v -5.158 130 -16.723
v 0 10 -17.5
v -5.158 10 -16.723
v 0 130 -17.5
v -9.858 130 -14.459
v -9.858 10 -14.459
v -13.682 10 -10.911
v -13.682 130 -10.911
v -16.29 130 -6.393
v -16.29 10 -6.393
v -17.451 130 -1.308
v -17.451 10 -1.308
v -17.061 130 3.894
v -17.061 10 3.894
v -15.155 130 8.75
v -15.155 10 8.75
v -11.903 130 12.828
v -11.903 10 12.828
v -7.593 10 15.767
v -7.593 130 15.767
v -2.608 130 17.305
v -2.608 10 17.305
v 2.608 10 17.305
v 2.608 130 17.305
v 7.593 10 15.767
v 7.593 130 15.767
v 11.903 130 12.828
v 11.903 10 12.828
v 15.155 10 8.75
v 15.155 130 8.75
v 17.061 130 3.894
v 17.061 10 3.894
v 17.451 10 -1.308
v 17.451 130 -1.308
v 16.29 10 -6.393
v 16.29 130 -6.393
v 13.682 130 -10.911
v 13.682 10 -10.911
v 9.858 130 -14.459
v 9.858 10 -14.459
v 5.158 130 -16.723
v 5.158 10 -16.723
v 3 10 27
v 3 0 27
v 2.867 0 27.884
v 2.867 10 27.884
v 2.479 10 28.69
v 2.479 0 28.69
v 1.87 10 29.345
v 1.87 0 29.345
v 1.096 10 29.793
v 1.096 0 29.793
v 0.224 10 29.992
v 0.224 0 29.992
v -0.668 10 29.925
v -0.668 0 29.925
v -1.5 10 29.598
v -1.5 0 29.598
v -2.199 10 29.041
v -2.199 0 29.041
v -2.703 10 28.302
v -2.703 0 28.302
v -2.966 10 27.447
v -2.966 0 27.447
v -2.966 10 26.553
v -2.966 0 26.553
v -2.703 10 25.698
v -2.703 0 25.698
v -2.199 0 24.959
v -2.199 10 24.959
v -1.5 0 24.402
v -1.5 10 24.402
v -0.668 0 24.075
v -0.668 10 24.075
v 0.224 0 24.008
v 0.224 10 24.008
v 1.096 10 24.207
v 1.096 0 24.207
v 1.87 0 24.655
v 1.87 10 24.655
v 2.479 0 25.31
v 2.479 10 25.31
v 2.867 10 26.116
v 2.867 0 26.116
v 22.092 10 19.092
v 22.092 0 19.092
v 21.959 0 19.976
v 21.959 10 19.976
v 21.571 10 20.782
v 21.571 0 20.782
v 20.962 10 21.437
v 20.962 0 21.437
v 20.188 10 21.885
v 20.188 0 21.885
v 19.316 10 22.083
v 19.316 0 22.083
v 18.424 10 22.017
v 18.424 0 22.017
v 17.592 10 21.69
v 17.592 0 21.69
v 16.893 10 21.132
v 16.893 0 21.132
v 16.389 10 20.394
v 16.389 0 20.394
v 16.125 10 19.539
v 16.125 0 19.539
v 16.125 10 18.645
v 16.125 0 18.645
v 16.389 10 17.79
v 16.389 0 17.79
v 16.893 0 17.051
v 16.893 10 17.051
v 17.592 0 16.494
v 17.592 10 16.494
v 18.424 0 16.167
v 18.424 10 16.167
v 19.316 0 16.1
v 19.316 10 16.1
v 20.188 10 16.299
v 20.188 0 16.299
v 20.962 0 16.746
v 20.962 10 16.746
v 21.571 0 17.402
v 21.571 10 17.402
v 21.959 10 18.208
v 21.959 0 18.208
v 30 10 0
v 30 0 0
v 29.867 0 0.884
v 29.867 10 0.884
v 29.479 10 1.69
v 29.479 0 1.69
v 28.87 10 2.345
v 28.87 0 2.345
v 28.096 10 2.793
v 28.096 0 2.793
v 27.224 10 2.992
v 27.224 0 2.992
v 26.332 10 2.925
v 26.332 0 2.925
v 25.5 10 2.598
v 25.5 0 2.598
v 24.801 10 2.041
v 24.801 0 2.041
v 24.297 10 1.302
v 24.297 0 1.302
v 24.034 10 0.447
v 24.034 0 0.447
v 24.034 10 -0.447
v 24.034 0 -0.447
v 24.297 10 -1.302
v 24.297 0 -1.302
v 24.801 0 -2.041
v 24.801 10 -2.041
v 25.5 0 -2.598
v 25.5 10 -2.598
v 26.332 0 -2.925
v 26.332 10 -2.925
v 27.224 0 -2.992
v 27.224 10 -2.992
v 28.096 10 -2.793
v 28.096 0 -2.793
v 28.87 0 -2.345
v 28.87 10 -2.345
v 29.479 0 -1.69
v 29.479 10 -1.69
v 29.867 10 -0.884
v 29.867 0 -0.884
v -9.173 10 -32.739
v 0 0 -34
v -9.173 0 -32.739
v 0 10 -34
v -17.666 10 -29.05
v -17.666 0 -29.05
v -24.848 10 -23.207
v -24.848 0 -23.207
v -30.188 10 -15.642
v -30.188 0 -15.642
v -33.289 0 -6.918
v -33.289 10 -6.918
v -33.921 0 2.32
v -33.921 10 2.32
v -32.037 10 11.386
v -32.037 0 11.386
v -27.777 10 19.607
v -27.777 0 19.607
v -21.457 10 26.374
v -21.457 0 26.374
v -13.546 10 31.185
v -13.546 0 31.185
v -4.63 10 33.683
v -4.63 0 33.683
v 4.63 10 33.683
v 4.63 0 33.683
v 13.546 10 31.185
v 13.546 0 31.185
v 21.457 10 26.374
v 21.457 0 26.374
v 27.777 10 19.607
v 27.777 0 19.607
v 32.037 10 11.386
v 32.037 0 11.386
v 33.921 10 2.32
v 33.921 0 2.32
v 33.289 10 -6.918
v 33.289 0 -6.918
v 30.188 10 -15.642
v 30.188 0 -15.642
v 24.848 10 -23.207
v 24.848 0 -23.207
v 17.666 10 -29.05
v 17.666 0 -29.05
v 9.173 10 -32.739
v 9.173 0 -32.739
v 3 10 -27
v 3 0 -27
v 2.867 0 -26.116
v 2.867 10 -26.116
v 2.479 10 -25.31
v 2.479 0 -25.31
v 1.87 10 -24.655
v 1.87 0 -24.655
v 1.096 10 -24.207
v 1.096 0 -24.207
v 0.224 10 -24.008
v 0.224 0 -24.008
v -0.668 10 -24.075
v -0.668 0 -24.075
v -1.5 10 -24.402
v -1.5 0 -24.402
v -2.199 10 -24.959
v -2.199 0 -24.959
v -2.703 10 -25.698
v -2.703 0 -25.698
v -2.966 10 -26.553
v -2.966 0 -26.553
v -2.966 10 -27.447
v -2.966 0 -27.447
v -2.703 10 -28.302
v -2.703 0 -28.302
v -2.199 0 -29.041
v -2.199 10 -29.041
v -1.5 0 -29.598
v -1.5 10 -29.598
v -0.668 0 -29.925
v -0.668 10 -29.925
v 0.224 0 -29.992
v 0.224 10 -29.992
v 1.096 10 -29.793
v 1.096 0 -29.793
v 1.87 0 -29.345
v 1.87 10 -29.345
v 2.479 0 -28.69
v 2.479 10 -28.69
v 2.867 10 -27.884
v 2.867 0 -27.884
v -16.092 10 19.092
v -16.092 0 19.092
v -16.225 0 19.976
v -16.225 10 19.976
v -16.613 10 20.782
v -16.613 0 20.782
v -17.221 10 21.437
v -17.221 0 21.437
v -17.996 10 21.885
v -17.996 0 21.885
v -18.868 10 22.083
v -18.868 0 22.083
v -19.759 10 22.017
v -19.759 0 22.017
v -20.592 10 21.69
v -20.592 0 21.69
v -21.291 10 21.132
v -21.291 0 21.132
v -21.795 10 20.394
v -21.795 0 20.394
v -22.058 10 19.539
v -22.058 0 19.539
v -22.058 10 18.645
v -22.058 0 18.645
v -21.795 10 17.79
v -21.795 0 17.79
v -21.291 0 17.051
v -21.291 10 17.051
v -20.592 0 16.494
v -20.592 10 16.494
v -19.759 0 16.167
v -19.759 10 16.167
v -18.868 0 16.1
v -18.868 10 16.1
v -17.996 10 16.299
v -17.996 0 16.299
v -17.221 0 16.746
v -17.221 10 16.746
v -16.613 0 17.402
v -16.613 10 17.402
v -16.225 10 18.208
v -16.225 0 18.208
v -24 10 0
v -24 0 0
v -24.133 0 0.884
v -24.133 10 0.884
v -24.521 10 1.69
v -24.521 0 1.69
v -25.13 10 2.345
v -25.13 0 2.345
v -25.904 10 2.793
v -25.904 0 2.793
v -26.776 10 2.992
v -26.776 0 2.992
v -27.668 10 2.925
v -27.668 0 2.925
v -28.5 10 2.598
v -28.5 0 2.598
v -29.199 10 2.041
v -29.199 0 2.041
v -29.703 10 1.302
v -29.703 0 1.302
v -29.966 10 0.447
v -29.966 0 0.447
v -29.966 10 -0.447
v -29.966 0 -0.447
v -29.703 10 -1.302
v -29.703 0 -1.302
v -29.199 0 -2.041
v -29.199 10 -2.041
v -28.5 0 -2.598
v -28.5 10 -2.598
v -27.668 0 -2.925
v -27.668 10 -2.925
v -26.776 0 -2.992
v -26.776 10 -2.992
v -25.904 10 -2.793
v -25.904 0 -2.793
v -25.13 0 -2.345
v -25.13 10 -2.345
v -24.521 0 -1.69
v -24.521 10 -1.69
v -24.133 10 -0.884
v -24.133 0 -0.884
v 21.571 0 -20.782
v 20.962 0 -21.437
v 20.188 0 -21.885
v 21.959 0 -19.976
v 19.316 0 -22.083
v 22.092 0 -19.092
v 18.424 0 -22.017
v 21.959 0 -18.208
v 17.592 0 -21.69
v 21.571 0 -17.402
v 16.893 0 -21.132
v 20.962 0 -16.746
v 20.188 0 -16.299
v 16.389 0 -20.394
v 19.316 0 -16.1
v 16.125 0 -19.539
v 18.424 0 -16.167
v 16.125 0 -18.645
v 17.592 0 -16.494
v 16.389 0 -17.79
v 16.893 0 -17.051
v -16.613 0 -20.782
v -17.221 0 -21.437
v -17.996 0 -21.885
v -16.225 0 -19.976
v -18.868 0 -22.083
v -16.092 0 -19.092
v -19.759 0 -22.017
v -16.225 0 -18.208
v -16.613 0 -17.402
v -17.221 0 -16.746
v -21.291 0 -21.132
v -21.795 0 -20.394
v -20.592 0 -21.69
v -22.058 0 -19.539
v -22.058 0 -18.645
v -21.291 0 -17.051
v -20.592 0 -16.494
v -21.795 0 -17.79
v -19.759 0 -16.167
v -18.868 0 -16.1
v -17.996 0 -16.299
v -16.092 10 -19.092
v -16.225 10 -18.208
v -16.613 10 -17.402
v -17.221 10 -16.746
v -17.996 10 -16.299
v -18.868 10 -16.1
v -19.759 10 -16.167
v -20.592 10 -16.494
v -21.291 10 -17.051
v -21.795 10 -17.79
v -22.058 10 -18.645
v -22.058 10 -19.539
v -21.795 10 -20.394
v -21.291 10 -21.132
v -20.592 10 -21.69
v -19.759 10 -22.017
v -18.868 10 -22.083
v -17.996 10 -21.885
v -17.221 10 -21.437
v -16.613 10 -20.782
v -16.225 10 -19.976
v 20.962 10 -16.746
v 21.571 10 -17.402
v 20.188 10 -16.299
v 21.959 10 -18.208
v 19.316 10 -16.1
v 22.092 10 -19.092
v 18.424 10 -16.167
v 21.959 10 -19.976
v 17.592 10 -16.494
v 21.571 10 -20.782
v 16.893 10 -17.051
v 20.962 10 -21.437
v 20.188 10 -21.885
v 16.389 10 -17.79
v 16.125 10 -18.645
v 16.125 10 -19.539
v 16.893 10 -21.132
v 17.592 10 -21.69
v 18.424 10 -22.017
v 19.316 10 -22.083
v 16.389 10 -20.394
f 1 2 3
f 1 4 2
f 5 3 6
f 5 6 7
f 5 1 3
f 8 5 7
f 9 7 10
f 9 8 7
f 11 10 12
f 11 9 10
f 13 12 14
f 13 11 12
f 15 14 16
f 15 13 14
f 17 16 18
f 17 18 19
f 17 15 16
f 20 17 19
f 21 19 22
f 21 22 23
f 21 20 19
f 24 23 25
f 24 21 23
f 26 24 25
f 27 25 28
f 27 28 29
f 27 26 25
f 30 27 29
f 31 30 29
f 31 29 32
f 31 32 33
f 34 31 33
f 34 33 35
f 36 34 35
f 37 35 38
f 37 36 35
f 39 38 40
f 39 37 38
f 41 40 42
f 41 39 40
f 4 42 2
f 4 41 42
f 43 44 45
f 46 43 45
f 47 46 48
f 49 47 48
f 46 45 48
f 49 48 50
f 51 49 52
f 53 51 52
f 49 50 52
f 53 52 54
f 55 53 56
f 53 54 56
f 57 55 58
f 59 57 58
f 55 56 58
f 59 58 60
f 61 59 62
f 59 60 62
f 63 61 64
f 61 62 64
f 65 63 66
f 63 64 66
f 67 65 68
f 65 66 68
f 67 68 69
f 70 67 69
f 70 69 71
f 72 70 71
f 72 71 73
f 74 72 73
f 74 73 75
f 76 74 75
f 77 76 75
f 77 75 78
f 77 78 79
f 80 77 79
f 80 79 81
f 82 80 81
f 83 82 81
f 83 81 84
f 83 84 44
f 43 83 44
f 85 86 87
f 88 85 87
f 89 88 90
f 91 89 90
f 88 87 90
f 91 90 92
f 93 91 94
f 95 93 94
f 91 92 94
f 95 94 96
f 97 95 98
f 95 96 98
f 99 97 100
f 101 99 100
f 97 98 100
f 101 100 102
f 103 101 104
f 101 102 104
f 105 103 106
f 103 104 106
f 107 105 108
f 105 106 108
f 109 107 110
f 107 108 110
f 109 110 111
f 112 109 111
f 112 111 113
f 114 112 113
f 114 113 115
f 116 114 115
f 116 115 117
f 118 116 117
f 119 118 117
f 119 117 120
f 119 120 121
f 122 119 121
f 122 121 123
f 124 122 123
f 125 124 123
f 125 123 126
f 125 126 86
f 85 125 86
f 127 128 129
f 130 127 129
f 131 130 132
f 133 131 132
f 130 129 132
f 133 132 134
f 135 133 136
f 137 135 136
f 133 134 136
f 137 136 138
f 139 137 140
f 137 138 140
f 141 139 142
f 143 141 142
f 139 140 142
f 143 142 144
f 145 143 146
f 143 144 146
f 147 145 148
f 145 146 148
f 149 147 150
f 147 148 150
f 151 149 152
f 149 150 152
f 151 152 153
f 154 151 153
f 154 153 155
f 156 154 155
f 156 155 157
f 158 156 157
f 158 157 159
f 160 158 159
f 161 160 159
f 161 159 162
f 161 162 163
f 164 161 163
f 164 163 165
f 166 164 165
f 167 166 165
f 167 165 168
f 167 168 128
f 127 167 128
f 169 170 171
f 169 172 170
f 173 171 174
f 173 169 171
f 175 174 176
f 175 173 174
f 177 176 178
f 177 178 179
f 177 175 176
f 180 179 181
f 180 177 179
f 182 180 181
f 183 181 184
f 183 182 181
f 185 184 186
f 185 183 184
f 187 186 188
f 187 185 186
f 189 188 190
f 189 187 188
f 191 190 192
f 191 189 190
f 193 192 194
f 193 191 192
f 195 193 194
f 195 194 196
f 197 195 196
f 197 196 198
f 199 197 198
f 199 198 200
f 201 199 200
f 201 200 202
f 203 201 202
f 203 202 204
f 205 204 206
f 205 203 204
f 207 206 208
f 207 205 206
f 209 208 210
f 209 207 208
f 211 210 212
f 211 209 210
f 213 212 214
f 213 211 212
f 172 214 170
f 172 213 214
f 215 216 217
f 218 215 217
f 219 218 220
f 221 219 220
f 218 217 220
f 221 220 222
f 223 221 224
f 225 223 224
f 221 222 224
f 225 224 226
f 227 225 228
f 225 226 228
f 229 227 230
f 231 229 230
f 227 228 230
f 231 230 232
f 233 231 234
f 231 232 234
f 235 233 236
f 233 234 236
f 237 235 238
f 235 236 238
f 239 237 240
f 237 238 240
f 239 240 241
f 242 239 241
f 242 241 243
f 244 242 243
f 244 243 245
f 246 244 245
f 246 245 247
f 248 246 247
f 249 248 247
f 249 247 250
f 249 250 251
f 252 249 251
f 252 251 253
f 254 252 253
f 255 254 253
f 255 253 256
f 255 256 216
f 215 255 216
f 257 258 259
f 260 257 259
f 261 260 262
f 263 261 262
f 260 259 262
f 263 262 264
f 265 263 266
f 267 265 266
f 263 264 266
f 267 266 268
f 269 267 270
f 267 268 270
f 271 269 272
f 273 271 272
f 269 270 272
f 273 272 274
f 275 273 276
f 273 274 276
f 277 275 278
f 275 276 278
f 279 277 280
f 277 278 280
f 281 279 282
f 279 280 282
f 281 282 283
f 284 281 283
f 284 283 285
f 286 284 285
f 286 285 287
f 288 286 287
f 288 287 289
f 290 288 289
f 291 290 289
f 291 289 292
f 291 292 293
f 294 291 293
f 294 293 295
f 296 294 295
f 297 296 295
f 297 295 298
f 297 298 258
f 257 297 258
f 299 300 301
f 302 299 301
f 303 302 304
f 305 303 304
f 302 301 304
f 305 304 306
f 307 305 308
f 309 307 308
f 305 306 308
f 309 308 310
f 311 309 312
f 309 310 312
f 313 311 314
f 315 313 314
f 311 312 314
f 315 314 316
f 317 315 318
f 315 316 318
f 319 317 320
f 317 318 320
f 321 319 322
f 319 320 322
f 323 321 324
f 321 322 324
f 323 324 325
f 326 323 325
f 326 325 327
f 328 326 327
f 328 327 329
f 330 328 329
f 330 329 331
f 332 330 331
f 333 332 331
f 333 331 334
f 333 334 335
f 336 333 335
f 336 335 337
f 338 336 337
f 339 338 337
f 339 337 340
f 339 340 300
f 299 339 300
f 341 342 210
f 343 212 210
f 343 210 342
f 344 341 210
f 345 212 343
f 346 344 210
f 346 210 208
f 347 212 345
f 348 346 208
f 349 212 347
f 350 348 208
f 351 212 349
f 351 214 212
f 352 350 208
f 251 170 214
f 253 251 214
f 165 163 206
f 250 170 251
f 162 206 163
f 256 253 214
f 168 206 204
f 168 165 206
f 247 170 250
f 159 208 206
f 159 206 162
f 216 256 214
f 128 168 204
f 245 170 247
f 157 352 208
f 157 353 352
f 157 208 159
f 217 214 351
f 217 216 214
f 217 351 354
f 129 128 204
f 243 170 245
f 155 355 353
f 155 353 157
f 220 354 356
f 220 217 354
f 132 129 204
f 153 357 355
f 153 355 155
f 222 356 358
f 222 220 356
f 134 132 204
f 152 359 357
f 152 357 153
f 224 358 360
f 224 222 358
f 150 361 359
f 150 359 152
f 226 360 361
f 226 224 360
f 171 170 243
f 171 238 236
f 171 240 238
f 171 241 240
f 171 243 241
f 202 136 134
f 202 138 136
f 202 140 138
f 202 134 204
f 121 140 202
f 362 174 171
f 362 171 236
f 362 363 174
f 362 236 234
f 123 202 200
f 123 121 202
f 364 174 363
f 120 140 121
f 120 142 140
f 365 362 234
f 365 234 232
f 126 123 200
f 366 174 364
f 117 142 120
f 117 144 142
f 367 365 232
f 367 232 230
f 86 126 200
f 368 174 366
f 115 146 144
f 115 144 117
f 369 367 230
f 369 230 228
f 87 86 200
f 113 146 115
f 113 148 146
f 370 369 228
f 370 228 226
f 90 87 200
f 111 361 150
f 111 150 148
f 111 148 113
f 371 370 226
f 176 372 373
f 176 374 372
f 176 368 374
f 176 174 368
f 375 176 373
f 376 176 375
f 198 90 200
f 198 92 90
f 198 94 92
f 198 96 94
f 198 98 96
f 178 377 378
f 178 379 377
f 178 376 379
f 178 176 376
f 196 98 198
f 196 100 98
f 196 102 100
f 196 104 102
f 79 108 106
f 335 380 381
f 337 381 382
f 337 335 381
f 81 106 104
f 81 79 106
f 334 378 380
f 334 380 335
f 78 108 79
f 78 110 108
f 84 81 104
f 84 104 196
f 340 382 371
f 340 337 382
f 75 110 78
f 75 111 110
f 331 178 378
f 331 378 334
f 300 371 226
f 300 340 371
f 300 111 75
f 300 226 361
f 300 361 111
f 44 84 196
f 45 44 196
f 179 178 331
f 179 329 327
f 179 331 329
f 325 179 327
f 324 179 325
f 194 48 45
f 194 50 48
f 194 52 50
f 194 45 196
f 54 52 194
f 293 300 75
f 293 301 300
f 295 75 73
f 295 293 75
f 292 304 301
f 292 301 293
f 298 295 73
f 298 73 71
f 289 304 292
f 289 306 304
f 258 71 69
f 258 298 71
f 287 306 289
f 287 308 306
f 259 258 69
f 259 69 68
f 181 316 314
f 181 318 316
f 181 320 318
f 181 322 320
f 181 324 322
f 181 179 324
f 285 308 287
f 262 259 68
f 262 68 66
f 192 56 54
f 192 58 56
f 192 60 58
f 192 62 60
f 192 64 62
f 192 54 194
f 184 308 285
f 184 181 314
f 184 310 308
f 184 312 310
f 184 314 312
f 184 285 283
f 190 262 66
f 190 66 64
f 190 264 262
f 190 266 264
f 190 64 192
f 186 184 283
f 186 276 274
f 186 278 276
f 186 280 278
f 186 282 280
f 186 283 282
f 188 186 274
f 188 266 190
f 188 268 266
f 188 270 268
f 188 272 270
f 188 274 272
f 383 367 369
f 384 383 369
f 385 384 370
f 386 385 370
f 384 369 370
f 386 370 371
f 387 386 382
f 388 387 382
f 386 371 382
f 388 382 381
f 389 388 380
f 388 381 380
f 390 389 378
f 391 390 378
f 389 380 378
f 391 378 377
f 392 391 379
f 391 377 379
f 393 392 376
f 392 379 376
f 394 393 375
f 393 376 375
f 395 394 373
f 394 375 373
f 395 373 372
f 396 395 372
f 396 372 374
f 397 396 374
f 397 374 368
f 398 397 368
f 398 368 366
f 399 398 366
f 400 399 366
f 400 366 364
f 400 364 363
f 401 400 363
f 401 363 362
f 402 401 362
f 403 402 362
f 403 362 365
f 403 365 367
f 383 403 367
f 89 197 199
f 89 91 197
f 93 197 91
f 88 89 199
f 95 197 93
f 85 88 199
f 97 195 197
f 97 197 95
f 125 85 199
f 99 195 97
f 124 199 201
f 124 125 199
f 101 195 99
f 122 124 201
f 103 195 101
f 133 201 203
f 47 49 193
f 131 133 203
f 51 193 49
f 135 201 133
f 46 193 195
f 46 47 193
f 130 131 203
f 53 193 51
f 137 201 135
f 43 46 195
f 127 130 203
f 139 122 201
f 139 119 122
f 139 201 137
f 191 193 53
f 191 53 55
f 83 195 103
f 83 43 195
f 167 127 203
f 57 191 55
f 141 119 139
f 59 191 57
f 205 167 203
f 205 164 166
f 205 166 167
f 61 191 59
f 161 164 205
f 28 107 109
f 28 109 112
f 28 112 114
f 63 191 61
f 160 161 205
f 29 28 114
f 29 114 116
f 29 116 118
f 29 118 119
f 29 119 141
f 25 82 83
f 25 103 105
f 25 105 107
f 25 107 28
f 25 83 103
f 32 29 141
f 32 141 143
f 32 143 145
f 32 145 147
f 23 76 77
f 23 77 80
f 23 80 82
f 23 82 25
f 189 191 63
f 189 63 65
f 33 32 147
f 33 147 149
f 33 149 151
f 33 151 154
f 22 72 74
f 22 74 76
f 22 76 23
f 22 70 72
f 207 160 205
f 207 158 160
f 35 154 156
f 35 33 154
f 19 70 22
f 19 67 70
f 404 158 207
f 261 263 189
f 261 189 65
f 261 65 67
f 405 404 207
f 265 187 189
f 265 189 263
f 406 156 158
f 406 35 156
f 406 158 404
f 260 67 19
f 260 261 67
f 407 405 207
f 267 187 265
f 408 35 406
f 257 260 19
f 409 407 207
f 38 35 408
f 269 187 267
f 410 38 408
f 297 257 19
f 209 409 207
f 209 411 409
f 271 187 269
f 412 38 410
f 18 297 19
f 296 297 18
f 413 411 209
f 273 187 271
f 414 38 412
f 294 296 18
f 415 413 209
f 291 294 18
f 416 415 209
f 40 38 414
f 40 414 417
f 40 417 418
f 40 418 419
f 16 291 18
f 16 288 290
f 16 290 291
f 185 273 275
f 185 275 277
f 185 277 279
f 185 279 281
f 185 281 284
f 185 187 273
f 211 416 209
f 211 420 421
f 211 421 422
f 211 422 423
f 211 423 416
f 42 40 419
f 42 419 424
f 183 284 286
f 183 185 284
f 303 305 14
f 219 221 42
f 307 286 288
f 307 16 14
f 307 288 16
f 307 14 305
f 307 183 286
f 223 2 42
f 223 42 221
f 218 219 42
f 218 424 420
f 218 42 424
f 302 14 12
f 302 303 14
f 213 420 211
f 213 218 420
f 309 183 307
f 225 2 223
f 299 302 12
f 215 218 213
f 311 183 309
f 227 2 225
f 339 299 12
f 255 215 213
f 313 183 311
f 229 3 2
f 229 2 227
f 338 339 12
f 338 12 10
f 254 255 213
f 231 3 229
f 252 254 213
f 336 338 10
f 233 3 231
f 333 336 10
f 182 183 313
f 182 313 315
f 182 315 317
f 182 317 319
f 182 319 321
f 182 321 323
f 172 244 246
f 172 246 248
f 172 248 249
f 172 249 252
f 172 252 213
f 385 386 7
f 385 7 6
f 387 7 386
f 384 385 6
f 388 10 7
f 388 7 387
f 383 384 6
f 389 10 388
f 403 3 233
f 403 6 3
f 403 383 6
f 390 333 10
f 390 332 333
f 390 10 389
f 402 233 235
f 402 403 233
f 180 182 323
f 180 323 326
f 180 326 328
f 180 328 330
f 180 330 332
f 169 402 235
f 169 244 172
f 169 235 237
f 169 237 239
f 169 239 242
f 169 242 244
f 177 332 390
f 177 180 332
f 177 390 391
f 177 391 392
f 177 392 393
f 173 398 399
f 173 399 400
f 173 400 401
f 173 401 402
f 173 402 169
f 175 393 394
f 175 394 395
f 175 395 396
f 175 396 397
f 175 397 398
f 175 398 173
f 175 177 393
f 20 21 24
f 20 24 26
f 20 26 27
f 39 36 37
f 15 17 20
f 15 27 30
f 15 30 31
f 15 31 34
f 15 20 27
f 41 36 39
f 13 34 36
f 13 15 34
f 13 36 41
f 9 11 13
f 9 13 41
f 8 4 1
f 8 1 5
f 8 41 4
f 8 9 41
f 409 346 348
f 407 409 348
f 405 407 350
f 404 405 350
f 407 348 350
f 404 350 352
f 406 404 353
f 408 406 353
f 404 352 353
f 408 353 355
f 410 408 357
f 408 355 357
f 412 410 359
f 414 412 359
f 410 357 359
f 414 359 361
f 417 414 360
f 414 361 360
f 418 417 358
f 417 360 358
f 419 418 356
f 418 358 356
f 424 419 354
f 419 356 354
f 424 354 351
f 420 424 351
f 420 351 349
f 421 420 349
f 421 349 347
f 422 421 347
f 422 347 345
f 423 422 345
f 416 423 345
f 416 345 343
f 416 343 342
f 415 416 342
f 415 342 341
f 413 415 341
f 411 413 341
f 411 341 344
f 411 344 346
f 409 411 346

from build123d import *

# Parameters (mm, degrees)
SKETCH3_R          = 3
CUT_EXTRUDE1_DEPTH = 131


with BuildPart() as part:
    # Sketch2 → Revolve1 (revolve)
    with BuildSketch(Plane(origin=(0, 0, 0), x_dir=(0, 0, -1), z_dir=(1, 0, 0))):
        Polygon((0, 0), (34, 0), (34, 10), (17.5, 10), (17.5, 130), (0, 130), align=None)
    revolve(axis=Axis((0, 0, 0), (0, 1, 0)))

    # Sketch3 → Cut-Extrude1 (cut, through all)
    with BuildSketch(Plane.XZ):
        with Locations((27, 0)):
            Circle(SKETCH3_R)
        with Locations((19.091883092, -19.091883092)):
            Circle(SKETCH3_R)
        with Locations((0, -27)):
            Circle(SKETCH3_R)
        with Locations((-19.091883092, -19.091883092)):
            Circle(SKETCH3_R)
        with Locations((-27, 0)):
            Circle(SKETCH3_R)
        with Locations((-19.091883092, 19.091883092)):
            Circle(SKETCH3_R)
        with Locations((0, 27)):
            Circle(SKETCH3_R)
        with Locations((19.091883092, 19.091883092)):
            Circle(SKETCH3_R)
    extrude(amount=-CUT_EXTRUDE1_DEPTH, mode=Mode.SUBTRACT)


solid = part.part
